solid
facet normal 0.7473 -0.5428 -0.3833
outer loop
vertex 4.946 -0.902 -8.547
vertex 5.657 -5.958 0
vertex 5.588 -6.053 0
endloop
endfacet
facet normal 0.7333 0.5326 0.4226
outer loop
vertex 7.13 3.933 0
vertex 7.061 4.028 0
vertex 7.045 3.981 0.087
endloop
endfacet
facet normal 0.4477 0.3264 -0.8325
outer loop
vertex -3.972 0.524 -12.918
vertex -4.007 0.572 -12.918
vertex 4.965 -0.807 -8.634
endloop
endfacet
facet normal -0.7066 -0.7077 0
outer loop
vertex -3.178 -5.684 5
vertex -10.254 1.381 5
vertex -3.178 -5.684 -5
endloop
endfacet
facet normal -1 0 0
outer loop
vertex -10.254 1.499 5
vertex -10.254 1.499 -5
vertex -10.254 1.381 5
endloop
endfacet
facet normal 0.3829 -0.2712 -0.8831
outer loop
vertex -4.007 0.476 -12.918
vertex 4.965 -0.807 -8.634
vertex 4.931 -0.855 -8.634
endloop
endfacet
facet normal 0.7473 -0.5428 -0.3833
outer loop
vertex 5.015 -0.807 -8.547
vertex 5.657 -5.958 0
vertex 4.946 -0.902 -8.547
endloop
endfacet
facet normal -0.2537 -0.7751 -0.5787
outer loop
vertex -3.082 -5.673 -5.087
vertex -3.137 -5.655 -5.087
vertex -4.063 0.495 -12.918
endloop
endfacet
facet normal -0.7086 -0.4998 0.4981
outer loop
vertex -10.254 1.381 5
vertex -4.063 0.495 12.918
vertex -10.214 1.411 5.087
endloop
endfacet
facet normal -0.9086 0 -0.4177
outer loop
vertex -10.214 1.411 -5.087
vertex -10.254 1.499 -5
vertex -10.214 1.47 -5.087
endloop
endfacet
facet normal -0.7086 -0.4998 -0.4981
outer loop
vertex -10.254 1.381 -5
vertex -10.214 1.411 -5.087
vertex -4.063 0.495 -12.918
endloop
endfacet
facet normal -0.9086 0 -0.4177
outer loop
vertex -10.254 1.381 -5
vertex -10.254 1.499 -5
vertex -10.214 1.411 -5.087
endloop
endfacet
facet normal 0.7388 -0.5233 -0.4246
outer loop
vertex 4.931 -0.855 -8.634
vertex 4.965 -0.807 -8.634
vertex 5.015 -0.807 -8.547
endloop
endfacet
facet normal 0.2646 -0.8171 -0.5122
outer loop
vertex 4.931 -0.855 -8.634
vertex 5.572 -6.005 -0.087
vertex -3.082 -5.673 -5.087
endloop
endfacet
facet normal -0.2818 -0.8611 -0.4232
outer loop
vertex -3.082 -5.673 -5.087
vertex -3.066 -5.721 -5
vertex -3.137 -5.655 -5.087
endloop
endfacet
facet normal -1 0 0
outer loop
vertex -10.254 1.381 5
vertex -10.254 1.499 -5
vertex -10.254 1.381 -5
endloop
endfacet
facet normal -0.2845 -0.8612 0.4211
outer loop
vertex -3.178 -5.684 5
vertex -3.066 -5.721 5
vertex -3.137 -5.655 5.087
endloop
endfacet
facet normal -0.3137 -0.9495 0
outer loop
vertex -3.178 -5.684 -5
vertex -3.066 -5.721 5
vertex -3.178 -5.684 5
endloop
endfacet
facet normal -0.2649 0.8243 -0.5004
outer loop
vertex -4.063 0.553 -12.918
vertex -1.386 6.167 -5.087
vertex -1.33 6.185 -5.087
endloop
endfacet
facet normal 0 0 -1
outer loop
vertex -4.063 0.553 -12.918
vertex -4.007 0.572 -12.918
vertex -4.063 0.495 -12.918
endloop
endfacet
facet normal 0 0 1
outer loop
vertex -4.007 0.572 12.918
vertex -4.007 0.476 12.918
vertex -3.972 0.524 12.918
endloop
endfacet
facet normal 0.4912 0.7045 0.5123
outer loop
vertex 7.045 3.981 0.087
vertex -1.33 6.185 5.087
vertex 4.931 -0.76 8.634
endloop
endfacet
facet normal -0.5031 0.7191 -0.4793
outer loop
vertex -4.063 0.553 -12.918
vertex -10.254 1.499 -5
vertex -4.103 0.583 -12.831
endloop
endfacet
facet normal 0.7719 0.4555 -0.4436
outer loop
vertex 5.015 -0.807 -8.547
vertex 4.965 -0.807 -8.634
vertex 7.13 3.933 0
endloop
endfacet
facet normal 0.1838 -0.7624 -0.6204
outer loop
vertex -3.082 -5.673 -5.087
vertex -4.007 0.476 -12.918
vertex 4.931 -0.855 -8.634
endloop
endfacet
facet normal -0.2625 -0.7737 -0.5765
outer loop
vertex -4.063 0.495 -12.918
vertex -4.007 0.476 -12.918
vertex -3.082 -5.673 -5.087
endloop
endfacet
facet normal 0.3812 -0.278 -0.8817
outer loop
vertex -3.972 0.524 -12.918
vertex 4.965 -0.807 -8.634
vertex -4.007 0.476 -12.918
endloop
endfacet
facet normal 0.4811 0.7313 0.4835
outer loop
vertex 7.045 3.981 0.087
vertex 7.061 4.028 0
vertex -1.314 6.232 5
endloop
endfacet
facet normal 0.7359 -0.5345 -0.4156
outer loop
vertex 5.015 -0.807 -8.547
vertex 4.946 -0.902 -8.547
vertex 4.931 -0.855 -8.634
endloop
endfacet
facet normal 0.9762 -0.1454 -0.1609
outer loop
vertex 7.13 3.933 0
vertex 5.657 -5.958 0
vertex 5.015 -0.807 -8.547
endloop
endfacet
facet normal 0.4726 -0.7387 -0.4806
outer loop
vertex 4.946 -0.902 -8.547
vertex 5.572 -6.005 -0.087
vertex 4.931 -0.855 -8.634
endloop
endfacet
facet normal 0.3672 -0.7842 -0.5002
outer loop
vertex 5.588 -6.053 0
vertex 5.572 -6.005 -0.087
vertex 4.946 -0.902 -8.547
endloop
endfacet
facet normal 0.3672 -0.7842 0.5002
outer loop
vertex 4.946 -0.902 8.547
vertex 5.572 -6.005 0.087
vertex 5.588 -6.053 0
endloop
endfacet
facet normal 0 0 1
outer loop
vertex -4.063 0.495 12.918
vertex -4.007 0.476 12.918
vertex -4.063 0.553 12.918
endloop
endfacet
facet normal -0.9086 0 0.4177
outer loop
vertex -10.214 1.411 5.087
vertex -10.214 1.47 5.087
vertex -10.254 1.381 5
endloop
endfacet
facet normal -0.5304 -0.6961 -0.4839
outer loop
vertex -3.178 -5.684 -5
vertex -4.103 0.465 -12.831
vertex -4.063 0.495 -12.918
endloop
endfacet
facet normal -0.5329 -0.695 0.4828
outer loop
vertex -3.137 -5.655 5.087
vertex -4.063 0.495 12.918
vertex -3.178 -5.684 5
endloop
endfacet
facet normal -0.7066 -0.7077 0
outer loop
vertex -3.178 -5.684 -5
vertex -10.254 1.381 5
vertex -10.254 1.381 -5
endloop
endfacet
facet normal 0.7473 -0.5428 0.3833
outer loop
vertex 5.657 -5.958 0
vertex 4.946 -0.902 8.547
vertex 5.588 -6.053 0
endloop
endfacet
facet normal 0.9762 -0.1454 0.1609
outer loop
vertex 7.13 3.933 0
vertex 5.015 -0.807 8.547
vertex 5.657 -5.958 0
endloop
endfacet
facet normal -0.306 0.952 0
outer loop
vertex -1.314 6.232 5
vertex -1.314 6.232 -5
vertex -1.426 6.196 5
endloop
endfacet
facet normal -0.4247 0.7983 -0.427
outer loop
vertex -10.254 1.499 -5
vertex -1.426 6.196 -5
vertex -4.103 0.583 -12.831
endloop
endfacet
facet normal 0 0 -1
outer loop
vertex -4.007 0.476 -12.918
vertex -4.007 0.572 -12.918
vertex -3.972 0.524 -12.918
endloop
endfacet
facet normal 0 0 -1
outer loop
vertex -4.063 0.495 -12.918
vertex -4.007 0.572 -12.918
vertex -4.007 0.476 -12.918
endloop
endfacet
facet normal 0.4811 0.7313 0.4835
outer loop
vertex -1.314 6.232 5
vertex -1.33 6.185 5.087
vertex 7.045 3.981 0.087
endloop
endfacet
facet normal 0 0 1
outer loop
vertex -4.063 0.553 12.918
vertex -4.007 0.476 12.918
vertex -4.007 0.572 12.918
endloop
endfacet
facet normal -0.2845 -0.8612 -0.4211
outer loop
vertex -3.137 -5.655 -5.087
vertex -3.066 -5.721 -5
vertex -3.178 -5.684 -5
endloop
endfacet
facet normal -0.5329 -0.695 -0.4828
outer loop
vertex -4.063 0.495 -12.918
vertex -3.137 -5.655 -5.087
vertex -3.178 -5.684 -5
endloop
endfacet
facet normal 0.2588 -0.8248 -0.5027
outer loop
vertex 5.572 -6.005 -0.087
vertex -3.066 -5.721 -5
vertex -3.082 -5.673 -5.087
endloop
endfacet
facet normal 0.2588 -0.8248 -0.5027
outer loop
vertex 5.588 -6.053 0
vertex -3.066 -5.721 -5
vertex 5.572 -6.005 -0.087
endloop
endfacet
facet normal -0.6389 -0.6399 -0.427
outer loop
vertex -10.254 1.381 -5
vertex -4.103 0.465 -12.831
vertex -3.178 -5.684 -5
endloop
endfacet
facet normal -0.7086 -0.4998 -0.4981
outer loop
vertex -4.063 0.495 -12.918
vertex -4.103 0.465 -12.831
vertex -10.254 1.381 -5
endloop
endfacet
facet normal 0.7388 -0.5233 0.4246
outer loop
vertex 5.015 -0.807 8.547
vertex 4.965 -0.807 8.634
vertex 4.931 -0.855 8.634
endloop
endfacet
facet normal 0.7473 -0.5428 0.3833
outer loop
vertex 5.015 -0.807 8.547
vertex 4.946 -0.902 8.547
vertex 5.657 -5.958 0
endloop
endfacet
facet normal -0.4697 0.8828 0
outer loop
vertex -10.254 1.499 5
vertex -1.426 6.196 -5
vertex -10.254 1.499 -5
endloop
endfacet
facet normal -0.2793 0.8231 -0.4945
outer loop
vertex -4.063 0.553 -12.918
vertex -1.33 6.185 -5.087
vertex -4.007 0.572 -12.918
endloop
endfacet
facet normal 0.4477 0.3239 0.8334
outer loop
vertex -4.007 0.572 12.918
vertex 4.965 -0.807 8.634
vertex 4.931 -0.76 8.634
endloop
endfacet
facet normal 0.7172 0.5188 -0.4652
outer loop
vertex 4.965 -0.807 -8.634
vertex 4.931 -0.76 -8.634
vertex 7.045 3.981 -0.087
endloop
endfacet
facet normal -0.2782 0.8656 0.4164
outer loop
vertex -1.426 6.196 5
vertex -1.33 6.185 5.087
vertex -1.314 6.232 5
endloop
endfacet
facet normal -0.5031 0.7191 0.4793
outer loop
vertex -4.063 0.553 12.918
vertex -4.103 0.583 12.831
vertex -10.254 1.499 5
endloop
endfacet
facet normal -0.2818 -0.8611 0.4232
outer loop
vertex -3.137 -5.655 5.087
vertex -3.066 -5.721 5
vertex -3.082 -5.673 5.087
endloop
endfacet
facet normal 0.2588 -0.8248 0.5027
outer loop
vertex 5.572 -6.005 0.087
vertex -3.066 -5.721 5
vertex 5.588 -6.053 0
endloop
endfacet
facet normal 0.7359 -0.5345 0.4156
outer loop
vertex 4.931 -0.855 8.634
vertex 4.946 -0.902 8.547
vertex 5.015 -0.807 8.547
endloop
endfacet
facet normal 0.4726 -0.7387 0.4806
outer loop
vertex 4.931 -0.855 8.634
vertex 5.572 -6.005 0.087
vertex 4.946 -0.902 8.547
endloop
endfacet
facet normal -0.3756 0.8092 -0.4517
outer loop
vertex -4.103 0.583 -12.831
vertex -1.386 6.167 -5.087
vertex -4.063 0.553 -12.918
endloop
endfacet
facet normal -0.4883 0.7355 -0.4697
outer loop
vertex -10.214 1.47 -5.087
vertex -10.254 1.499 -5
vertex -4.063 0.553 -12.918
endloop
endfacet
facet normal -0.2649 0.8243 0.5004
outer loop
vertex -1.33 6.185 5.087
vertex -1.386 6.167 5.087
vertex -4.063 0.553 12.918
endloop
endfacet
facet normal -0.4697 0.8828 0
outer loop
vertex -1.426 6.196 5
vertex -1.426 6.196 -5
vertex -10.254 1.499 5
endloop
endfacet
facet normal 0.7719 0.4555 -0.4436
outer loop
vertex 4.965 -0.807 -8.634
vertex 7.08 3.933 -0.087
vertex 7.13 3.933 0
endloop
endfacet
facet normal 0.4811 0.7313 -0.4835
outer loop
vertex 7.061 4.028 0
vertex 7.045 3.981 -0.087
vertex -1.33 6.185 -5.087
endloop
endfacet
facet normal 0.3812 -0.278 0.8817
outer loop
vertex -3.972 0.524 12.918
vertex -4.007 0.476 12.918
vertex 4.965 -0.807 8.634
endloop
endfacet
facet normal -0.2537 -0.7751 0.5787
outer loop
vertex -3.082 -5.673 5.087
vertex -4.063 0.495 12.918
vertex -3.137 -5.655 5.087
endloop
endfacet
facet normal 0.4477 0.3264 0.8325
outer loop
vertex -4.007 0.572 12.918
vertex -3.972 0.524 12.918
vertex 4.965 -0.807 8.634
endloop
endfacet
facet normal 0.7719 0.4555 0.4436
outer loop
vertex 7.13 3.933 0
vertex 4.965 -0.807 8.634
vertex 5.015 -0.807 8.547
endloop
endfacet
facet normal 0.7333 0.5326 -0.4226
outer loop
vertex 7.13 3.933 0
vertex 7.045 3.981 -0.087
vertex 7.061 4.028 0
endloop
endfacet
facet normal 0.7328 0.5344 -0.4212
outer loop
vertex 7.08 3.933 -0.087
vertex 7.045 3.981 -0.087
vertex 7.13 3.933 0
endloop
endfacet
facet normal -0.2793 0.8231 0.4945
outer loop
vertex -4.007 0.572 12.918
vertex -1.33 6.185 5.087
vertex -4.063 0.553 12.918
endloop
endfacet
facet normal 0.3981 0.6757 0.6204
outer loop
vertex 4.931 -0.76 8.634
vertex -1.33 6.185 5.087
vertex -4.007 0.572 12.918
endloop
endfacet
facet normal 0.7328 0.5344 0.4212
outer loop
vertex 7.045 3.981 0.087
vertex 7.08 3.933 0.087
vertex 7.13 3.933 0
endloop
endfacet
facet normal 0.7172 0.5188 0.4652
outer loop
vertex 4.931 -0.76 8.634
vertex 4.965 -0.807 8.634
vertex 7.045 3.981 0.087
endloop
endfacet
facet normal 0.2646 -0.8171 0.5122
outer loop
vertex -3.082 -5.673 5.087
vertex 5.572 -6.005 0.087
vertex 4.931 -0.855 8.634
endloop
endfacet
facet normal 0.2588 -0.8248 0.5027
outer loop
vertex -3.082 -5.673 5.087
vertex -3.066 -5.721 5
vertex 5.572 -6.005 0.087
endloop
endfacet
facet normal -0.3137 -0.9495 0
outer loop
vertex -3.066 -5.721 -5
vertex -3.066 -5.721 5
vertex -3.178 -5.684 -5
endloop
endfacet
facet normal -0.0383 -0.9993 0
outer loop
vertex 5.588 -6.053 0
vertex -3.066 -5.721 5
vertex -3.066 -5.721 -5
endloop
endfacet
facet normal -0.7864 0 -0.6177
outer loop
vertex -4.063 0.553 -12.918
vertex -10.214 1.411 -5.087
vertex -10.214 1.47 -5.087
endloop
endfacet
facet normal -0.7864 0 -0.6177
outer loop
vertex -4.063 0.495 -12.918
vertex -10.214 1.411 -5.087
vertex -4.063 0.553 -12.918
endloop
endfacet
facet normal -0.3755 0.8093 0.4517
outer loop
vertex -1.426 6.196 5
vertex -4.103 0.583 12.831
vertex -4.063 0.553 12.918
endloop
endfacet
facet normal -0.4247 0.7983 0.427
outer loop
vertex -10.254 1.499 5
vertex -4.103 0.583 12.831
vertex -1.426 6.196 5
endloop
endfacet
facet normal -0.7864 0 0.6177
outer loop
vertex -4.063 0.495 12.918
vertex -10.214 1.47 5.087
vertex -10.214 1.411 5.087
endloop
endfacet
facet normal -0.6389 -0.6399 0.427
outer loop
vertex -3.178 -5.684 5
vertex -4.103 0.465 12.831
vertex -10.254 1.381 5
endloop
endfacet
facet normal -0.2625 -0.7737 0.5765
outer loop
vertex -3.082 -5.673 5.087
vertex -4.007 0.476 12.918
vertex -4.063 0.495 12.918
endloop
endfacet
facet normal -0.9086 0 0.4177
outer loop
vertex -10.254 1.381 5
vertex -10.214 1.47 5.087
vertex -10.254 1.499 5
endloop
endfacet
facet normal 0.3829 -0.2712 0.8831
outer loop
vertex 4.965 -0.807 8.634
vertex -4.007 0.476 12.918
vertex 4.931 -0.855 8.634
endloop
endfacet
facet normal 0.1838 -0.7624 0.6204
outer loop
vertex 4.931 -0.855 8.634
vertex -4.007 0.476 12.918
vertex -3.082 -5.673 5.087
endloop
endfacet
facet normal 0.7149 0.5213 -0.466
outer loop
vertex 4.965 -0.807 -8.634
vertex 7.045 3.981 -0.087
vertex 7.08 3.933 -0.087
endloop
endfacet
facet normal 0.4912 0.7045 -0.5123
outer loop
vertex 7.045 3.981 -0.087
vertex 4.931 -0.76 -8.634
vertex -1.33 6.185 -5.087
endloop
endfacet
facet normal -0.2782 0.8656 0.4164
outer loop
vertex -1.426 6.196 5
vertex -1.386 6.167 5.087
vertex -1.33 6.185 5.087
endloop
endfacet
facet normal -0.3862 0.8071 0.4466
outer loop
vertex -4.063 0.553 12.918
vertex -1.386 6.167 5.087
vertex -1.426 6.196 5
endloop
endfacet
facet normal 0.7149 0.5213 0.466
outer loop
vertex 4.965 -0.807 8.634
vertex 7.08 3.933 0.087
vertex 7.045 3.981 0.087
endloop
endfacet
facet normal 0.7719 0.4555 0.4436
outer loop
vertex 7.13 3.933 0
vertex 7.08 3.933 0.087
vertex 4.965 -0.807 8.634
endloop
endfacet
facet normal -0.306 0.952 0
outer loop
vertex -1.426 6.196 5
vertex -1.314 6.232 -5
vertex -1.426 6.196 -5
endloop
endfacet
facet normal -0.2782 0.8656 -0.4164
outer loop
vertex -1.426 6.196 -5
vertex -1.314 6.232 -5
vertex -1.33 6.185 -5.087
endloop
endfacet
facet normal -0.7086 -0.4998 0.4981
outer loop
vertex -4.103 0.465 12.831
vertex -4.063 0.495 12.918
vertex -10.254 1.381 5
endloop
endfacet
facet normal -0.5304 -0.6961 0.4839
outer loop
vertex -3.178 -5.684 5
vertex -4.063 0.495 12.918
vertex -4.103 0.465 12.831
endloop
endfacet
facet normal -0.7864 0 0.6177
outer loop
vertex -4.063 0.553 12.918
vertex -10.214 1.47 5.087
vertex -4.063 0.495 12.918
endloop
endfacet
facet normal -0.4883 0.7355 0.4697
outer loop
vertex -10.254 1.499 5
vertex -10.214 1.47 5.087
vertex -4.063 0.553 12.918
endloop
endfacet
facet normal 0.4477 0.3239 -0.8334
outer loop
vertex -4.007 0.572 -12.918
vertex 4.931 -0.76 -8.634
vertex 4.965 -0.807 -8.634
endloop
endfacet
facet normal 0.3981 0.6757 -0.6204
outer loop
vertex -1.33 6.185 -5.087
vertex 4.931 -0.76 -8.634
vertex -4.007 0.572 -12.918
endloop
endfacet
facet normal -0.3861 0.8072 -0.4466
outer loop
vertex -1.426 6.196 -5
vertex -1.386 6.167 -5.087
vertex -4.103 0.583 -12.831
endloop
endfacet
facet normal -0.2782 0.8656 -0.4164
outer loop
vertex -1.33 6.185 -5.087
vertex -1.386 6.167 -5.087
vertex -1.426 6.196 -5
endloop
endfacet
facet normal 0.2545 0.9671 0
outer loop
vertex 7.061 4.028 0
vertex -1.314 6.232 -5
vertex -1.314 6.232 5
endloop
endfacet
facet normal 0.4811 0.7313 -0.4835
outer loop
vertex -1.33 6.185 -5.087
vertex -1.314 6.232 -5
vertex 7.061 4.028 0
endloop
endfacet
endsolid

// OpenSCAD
// Auto-generated OpenSCAD file

    inner_points = 10*[[-0.13450932832646978, 0.6137208793216535, -0.49999999999996475], [-0.30970268855061545, -0.5625709645316335, -0.5000000000000352], [-0.13450932832643542, 0.6137208793215885, 0.5000000000000352], [-0.3097026885505811, -0.5625709645316985, 0.49999999999996475], [-0.4022234175933843, 0.052401101187175045, -1.283102338831261], [-0.40222341759329616, 0.05240110118700812, 1.283102338831277], [0.4915267827134717, -0.08071135862540943, -0.8547430824889966], [0.49152678271353045, -0.08071135862552062, 0.8547430824889337], [-1.017331462216076, 0.14401343855176083, -0.499999999999965], [-1.0173314622160416, 0.1440134385516957, 0.500000000000035], [0.7029977653621209, 0.39330793047033674, -7.860303774857193e-15], [0.555685674258319, -0.5957821300472206, -6.713421756971425e-14]];

    outer_points = 10*[[-0.4935961942844095, -0.04399878007182188, -0.5983441385906083], [-0.5063460204819994, 0.04399878007182188, 0.5875939233346719], [0.5063460204819994, -0.04399878007182188, -0.5875939233346719], [0.4935961942844095, 0.04399878007182188, 0.5983441385906083], [-1.2828833411617955, 0.18160496168964152, -0.027267303587311748], [1.283173047764001, 0.18160496168964152, 0.00031994908835159333], [-0.8552676058642261, -0.7195265371946491, 0.04419460685783971], [0.8541197760563402, -0.7195265371946491, 0.06257195110839778], [-0.49933157435504716, 0.8017930567931236, -0.06486192322812147], [0.5006106404113617, 0.8017930567931236, -0.05411170797218501], [0.004675625240909675, -0.8954762230599844, -0.43490804114188575], [-0.006045121001836061, -0.8214830958078585, 0.5622930833658284]];

    // Convex hull for inner set (I)
    module inner_hull() {
        hull() {
            for (p = inner_points) {
                translate(p) sphere(r=0.1);
            }
        }
    }

    // Convex hull for outer set (O) minus inner hull (O \ I)
    module outer_minus_inner() {
        difference() {
            hull() {
                for (p = outer_points) {
                    translate(p) sphere(r=0.1);
                }
            }
            inner_hull(); // Subtract inner hull
        }
    }

    // Convex hull for outer set (O) minus all translated inner hulls
    module outer_minus_AllTranslationInner() {
        difference() {
            hull() {
                for (p = outer_points) {
                    translate(p) sphere(r=0.1);
                }
            }
            hull() {
                translate([0,0,50]) inner_hull();
                translate([0,0,-50]) inner_hull();
            }; // Subtract translated inner hulls
        }
    }

    // Difference between outer_minus_inner and outer_minus_AllTranslationInner
    module outer_minus_inner_diff() {
        difference() {
            // Outer minus inner
            difference() {
                hull() {
                    for (p = outer_points) {
                        translate(p) sphere(r=0.1);
                    }
                }
                inner_hull();
            }

            // Subtract Outer minus AllTranslationInner
            difference() {
                hull() {
                    for (p = outer_points) {
                        translate(p) sphere(r=0.1);
                    }
                }
                hull() {
                    translate([0,0,50]) inner_hull();
                    translate([0,0,-50]) inner_hull();
                };
            }
        }
    }

    // Rendering all with colors applied
    color([1, 0, 0, 0.5]) inner_hull(); // Transparent red
    
